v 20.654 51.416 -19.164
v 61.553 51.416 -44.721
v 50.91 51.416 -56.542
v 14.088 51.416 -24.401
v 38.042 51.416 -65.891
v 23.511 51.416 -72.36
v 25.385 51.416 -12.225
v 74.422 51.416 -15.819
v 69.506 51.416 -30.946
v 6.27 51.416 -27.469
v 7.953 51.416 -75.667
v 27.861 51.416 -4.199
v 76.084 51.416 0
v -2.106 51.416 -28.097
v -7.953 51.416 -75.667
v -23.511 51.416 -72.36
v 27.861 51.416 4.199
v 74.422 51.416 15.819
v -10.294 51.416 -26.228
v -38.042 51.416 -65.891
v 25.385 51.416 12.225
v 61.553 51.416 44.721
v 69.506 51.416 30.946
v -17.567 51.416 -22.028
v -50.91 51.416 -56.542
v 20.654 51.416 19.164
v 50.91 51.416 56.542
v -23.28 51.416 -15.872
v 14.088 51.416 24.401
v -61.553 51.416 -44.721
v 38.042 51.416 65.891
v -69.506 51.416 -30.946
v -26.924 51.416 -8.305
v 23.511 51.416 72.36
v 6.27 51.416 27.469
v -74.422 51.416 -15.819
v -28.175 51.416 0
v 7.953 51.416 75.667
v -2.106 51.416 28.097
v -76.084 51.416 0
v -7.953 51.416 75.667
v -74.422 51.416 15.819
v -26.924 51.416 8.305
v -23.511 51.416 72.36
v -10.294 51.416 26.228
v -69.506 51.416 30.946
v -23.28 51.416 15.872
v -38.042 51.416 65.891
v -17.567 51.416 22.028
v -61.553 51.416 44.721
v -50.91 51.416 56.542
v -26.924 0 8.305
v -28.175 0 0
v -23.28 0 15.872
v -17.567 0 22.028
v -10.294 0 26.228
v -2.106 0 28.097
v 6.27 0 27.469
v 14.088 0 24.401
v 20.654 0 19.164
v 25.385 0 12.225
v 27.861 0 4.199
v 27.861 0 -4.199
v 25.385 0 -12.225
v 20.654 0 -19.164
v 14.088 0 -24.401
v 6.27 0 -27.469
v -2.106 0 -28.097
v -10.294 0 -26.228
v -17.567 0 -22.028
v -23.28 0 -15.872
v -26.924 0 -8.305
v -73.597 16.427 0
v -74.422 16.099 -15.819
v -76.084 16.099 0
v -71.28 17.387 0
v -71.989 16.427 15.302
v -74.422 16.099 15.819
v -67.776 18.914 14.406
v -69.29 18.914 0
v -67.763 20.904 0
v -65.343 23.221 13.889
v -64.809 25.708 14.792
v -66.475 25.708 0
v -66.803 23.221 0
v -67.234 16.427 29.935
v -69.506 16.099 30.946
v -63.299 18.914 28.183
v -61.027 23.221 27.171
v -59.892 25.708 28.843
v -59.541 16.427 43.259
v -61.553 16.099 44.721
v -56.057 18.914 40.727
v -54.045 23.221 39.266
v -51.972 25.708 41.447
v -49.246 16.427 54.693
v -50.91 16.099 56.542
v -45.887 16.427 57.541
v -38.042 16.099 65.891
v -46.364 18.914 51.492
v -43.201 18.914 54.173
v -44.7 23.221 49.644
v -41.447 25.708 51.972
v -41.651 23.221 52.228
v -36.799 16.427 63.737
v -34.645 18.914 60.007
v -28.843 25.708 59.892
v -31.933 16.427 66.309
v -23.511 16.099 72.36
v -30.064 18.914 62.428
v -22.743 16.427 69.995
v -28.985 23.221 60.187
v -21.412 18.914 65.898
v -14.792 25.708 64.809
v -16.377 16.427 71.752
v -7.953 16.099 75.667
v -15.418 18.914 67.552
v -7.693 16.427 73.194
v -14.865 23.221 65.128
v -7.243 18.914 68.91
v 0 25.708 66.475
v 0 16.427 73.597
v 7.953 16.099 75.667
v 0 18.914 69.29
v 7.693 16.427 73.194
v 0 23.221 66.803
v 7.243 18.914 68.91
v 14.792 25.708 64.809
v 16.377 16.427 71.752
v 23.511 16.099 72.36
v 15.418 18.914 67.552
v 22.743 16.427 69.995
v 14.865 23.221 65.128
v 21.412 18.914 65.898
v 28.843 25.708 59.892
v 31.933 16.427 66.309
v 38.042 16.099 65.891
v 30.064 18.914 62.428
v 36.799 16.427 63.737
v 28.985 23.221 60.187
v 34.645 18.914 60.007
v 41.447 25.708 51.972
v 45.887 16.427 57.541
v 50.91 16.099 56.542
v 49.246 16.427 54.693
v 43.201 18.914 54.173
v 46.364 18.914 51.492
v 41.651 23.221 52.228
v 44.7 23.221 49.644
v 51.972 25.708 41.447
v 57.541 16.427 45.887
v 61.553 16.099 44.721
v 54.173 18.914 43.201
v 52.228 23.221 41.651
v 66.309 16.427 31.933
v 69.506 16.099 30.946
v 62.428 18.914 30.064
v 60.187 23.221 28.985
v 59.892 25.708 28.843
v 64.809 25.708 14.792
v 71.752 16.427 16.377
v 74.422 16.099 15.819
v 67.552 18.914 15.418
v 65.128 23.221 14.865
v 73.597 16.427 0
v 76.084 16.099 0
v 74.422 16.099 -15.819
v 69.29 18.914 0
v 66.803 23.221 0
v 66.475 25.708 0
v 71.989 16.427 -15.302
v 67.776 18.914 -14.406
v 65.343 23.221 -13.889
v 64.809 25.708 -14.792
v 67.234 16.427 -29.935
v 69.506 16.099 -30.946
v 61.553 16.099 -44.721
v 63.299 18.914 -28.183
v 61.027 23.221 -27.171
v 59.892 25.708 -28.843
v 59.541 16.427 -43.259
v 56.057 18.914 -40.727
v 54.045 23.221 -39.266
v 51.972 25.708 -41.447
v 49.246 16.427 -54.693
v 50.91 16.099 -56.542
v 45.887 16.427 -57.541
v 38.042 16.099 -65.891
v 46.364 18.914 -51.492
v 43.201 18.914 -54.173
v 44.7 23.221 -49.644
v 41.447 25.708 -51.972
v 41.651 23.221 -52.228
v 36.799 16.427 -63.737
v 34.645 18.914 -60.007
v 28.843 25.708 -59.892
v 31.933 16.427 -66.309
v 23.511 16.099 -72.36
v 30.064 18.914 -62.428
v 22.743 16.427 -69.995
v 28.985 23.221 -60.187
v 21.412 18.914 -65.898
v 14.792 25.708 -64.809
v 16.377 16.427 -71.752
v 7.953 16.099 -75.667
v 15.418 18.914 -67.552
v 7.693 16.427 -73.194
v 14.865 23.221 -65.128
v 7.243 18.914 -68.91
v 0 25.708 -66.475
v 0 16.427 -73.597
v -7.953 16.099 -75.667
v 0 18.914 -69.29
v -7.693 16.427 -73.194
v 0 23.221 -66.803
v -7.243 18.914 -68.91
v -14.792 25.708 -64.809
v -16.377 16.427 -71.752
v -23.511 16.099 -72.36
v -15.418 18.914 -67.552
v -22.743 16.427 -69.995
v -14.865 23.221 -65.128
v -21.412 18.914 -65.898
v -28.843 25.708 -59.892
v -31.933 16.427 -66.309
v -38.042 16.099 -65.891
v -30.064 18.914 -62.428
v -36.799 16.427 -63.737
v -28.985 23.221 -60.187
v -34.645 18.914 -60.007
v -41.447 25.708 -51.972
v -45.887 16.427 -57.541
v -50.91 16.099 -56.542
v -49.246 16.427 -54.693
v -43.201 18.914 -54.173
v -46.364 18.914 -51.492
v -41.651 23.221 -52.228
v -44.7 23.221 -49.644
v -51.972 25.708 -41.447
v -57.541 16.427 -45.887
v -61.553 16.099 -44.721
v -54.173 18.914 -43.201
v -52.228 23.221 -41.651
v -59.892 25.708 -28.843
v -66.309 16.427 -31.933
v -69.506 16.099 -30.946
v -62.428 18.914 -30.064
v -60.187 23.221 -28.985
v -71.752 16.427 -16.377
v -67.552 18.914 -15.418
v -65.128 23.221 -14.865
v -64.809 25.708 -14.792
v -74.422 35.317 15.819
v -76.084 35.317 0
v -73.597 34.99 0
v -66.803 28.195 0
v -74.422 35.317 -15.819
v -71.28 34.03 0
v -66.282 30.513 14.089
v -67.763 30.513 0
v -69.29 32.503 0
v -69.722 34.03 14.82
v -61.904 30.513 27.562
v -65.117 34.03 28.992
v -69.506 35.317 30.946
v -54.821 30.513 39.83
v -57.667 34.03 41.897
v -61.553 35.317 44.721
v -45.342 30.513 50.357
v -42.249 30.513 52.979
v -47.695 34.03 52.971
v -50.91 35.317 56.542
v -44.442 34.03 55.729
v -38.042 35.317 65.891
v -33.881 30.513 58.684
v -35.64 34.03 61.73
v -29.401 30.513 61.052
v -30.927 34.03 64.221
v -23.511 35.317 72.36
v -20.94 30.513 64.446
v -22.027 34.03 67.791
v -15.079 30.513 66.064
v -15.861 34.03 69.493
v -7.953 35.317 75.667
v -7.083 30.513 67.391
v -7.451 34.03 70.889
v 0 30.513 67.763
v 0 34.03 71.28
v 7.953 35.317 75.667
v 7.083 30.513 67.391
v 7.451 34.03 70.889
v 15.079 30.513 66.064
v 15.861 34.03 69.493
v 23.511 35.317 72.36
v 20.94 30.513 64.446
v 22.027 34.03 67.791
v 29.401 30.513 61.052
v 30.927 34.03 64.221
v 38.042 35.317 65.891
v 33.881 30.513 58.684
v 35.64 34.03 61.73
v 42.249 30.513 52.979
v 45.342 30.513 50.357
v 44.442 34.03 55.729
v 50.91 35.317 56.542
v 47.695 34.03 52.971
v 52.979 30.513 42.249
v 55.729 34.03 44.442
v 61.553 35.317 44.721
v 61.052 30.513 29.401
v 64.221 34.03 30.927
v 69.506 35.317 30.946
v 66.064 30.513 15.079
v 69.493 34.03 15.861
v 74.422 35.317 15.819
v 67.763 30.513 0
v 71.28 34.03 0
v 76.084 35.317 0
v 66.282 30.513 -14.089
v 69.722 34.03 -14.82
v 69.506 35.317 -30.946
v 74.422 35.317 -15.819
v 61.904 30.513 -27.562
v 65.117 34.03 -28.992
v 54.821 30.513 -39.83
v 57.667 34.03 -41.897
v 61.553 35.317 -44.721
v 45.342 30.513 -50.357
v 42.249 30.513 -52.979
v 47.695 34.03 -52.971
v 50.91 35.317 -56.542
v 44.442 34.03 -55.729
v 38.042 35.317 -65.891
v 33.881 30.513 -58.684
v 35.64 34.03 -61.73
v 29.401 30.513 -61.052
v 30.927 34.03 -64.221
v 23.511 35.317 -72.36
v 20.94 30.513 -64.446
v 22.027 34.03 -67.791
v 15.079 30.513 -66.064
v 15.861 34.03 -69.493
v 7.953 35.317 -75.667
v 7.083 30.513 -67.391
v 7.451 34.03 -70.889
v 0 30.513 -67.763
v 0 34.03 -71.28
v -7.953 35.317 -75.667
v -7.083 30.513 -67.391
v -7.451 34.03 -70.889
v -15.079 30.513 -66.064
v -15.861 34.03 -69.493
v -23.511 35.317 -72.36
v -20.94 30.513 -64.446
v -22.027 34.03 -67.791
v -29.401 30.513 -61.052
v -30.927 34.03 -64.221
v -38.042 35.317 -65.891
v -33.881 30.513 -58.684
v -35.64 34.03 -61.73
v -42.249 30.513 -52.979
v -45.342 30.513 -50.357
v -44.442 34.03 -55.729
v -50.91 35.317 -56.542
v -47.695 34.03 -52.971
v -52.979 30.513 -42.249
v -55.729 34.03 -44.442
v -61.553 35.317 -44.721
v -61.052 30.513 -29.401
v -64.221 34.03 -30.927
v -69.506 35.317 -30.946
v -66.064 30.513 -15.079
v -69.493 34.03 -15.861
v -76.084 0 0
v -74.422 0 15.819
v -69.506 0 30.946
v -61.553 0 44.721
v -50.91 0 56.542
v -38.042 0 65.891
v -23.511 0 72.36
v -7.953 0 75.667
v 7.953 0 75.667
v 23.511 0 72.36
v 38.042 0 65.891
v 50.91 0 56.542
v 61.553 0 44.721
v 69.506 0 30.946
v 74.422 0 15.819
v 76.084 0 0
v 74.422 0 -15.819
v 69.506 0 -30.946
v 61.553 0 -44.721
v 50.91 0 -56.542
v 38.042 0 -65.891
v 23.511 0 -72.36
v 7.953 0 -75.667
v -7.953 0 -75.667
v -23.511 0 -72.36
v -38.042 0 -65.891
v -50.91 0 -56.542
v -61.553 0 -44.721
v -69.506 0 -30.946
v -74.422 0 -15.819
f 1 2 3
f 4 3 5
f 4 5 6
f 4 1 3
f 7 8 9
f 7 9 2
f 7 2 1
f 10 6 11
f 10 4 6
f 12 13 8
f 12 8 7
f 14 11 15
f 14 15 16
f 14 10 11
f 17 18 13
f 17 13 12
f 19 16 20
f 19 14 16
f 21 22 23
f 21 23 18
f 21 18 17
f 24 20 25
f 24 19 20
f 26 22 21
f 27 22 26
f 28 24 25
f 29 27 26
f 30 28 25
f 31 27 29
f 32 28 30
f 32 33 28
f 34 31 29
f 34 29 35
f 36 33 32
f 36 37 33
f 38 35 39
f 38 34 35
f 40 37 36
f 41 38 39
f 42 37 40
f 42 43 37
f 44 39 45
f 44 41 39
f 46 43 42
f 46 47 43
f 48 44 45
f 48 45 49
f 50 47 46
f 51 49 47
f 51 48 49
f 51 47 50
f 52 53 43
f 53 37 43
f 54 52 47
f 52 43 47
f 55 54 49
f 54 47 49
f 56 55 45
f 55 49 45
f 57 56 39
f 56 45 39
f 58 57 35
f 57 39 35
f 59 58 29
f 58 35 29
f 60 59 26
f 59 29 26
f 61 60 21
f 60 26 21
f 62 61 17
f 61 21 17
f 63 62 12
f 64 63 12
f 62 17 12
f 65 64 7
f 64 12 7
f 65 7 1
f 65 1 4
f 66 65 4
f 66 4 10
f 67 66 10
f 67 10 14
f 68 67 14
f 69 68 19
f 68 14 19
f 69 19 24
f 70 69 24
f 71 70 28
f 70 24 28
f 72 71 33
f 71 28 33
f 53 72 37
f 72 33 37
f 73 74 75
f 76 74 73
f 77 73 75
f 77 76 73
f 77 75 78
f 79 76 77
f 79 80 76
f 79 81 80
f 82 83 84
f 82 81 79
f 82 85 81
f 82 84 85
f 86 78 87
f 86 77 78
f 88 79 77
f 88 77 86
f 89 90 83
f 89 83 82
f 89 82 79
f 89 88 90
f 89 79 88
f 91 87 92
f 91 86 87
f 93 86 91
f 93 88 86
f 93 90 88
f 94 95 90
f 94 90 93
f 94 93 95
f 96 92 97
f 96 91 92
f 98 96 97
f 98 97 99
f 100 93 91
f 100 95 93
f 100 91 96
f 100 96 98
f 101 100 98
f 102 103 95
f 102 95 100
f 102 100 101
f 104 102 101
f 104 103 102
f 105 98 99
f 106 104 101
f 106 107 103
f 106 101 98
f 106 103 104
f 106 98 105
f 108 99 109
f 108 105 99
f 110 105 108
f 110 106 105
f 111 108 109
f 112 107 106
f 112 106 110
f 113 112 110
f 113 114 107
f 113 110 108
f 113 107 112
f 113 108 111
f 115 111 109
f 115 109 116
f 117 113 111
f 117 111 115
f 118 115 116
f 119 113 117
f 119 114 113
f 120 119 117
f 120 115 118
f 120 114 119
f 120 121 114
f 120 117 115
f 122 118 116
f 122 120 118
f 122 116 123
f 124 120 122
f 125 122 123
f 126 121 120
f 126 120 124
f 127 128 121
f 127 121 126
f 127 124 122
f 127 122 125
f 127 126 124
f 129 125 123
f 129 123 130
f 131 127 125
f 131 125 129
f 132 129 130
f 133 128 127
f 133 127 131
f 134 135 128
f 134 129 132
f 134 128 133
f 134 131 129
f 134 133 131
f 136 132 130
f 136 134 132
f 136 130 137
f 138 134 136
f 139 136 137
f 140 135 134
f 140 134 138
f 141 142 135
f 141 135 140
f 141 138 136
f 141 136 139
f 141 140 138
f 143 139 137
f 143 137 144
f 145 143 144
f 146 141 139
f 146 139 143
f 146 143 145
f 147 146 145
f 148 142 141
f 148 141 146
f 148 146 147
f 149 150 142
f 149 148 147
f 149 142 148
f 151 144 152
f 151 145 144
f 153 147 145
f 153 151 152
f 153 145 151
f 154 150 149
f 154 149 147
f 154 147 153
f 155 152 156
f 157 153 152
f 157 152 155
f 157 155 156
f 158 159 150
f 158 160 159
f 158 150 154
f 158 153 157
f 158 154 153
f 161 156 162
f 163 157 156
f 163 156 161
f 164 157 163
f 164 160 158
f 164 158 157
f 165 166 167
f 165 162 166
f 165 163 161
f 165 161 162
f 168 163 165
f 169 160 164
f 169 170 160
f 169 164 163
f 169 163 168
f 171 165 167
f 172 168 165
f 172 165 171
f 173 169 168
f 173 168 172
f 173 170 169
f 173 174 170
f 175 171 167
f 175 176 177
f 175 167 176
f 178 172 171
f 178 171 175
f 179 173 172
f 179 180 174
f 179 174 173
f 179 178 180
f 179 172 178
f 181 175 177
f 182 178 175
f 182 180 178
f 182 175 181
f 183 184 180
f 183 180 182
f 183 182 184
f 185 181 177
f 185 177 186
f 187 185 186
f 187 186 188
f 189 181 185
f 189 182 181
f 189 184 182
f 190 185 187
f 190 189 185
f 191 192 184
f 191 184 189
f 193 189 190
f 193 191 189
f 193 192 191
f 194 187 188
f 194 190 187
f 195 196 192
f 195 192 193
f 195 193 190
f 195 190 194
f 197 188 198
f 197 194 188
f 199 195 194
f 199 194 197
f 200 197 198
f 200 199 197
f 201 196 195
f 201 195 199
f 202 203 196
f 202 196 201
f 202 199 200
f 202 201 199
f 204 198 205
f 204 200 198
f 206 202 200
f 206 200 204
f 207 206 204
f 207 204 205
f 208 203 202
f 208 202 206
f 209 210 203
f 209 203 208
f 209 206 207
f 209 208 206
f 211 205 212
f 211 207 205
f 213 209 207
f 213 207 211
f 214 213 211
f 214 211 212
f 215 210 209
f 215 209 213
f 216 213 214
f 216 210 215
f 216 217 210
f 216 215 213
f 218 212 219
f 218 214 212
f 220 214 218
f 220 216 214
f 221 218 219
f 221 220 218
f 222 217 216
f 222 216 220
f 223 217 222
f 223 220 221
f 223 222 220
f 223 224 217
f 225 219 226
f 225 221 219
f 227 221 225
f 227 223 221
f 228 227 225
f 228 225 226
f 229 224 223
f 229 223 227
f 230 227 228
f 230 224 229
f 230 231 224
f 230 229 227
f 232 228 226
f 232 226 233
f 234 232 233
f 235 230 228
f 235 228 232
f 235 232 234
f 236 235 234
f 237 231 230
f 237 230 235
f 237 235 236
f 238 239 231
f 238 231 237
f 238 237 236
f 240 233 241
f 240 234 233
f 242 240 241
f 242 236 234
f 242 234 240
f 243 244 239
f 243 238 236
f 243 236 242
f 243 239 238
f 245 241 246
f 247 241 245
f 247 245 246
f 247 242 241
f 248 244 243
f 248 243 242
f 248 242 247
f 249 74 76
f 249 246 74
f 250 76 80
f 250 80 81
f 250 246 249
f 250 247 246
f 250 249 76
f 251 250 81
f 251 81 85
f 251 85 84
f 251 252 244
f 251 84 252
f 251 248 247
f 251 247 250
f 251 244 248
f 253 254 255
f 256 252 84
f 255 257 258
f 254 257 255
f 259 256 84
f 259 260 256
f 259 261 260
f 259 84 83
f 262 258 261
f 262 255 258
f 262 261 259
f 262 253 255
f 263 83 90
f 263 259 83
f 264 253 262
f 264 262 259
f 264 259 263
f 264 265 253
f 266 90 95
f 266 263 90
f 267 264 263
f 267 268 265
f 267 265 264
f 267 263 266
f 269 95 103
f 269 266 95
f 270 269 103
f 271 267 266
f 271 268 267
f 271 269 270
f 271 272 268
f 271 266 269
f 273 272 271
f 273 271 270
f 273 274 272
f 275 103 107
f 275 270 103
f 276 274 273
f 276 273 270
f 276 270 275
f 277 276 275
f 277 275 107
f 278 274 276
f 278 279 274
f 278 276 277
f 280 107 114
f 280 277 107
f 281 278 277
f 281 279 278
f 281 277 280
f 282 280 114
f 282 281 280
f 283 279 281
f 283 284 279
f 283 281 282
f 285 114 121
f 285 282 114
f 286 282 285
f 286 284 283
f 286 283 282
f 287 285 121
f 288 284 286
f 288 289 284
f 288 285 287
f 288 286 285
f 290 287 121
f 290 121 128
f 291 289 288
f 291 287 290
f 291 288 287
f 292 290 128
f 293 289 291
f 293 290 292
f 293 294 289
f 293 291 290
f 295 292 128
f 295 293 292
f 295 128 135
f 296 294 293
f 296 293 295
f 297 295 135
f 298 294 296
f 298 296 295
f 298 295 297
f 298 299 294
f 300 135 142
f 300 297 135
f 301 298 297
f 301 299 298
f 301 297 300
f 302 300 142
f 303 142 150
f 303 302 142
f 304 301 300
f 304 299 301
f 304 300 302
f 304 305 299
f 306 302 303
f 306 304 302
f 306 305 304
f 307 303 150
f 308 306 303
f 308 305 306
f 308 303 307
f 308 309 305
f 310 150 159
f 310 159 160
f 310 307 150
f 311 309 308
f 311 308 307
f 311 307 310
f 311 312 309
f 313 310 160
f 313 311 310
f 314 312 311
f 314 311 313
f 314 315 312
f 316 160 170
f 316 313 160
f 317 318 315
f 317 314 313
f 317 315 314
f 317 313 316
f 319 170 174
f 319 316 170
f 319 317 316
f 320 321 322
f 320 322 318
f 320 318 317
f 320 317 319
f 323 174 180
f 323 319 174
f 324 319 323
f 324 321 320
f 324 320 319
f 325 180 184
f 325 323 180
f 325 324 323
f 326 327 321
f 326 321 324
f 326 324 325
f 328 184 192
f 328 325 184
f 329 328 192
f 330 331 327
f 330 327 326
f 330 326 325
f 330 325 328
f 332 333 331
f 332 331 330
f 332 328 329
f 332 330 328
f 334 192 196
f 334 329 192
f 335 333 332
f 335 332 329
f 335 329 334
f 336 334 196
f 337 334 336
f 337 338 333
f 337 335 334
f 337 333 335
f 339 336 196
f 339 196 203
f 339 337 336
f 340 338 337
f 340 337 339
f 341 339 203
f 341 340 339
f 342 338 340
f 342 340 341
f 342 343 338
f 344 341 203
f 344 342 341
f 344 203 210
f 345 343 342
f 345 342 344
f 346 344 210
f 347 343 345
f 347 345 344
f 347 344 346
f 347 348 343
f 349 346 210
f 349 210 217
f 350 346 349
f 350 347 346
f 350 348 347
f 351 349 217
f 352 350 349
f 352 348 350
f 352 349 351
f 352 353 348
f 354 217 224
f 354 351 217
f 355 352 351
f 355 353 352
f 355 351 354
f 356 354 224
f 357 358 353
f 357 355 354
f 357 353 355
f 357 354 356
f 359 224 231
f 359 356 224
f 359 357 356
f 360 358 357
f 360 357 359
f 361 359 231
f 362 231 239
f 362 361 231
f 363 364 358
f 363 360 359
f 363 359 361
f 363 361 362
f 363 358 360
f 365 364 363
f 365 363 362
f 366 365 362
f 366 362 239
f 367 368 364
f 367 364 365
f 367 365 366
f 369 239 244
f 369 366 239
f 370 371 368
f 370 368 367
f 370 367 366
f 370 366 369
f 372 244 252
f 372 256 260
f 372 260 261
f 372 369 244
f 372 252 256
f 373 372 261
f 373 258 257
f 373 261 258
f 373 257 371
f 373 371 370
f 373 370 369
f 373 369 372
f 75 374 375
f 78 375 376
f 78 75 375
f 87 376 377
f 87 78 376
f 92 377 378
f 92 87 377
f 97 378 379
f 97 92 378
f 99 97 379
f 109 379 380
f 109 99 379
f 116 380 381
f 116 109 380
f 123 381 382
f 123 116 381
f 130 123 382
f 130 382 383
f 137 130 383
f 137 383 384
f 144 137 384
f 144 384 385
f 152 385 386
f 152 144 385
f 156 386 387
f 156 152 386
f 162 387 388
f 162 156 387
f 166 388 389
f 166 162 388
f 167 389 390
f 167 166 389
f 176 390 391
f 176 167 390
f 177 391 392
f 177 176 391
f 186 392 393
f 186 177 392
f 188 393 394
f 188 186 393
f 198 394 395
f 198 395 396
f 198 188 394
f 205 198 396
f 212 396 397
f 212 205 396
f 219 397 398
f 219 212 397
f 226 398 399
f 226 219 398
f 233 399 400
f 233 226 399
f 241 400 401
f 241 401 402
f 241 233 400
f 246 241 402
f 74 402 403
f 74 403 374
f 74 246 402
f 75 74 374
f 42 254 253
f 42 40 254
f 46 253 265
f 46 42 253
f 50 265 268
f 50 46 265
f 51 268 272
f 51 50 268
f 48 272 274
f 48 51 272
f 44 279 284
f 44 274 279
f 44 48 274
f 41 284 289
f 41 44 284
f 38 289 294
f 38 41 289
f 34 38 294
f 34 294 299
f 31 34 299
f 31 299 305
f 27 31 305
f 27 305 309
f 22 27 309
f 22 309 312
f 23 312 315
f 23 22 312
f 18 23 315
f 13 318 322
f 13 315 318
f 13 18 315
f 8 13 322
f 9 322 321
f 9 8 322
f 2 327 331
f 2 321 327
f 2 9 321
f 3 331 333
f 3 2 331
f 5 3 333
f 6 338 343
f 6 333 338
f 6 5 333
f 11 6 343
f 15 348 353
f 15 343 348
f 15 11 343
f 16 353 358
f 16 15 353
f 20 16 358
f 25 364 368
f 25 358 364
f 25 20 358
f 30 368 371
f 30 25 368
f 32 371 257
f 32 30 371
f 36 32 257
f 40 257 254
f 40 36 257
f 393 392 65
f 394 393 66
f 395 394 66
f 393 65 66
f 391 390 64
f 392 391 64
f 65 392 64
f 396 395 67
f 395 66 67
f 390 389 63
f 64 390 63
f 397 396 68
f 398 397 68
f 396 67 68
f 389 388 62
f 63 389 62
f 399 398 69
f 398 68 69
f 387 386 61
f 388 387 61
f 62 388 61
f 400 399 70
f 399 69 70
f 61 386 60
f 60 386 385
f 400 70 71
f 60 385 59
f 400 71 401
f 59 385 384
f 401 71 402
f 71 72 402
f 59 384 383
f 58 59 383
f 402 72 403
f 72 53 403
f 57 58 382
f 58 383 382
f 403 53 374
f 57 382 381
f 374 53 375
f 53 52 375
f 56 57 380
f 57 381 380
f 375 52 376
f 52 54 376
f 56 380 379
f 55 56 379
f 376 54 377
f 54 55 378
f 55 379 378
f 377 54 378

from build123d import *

# Parameters (mm, degrees)
SKETCH1_W = 47.908763192
SKETCH1_H = 51.416423574
SKETCH3_R = 9.608888213


with BuildPart() as part:
    # Sketch1 → Revolve1 (revolve)
    with BuildSketch(Plane.XY):
        with Locations((-52.129799597, 25.708211787)):
            Rectangle(SKETCH1_W, SKETCH1_H)
    revolve(axis=Axis((0, 0, 0), (0, 1, 0)))

    # Sketch3 → Cut-Revolve1 (revolve, cut)
    with BuildSketch(Plane.XY):
        with Locations((-76.084181193, 25.708211787)):
            Circle(SKETCH3_R)
    revolve(axis=Axis((0, 0, 0), (0, 1, 0)), mode=Mode.SUBTRACT)


solid = part.part
